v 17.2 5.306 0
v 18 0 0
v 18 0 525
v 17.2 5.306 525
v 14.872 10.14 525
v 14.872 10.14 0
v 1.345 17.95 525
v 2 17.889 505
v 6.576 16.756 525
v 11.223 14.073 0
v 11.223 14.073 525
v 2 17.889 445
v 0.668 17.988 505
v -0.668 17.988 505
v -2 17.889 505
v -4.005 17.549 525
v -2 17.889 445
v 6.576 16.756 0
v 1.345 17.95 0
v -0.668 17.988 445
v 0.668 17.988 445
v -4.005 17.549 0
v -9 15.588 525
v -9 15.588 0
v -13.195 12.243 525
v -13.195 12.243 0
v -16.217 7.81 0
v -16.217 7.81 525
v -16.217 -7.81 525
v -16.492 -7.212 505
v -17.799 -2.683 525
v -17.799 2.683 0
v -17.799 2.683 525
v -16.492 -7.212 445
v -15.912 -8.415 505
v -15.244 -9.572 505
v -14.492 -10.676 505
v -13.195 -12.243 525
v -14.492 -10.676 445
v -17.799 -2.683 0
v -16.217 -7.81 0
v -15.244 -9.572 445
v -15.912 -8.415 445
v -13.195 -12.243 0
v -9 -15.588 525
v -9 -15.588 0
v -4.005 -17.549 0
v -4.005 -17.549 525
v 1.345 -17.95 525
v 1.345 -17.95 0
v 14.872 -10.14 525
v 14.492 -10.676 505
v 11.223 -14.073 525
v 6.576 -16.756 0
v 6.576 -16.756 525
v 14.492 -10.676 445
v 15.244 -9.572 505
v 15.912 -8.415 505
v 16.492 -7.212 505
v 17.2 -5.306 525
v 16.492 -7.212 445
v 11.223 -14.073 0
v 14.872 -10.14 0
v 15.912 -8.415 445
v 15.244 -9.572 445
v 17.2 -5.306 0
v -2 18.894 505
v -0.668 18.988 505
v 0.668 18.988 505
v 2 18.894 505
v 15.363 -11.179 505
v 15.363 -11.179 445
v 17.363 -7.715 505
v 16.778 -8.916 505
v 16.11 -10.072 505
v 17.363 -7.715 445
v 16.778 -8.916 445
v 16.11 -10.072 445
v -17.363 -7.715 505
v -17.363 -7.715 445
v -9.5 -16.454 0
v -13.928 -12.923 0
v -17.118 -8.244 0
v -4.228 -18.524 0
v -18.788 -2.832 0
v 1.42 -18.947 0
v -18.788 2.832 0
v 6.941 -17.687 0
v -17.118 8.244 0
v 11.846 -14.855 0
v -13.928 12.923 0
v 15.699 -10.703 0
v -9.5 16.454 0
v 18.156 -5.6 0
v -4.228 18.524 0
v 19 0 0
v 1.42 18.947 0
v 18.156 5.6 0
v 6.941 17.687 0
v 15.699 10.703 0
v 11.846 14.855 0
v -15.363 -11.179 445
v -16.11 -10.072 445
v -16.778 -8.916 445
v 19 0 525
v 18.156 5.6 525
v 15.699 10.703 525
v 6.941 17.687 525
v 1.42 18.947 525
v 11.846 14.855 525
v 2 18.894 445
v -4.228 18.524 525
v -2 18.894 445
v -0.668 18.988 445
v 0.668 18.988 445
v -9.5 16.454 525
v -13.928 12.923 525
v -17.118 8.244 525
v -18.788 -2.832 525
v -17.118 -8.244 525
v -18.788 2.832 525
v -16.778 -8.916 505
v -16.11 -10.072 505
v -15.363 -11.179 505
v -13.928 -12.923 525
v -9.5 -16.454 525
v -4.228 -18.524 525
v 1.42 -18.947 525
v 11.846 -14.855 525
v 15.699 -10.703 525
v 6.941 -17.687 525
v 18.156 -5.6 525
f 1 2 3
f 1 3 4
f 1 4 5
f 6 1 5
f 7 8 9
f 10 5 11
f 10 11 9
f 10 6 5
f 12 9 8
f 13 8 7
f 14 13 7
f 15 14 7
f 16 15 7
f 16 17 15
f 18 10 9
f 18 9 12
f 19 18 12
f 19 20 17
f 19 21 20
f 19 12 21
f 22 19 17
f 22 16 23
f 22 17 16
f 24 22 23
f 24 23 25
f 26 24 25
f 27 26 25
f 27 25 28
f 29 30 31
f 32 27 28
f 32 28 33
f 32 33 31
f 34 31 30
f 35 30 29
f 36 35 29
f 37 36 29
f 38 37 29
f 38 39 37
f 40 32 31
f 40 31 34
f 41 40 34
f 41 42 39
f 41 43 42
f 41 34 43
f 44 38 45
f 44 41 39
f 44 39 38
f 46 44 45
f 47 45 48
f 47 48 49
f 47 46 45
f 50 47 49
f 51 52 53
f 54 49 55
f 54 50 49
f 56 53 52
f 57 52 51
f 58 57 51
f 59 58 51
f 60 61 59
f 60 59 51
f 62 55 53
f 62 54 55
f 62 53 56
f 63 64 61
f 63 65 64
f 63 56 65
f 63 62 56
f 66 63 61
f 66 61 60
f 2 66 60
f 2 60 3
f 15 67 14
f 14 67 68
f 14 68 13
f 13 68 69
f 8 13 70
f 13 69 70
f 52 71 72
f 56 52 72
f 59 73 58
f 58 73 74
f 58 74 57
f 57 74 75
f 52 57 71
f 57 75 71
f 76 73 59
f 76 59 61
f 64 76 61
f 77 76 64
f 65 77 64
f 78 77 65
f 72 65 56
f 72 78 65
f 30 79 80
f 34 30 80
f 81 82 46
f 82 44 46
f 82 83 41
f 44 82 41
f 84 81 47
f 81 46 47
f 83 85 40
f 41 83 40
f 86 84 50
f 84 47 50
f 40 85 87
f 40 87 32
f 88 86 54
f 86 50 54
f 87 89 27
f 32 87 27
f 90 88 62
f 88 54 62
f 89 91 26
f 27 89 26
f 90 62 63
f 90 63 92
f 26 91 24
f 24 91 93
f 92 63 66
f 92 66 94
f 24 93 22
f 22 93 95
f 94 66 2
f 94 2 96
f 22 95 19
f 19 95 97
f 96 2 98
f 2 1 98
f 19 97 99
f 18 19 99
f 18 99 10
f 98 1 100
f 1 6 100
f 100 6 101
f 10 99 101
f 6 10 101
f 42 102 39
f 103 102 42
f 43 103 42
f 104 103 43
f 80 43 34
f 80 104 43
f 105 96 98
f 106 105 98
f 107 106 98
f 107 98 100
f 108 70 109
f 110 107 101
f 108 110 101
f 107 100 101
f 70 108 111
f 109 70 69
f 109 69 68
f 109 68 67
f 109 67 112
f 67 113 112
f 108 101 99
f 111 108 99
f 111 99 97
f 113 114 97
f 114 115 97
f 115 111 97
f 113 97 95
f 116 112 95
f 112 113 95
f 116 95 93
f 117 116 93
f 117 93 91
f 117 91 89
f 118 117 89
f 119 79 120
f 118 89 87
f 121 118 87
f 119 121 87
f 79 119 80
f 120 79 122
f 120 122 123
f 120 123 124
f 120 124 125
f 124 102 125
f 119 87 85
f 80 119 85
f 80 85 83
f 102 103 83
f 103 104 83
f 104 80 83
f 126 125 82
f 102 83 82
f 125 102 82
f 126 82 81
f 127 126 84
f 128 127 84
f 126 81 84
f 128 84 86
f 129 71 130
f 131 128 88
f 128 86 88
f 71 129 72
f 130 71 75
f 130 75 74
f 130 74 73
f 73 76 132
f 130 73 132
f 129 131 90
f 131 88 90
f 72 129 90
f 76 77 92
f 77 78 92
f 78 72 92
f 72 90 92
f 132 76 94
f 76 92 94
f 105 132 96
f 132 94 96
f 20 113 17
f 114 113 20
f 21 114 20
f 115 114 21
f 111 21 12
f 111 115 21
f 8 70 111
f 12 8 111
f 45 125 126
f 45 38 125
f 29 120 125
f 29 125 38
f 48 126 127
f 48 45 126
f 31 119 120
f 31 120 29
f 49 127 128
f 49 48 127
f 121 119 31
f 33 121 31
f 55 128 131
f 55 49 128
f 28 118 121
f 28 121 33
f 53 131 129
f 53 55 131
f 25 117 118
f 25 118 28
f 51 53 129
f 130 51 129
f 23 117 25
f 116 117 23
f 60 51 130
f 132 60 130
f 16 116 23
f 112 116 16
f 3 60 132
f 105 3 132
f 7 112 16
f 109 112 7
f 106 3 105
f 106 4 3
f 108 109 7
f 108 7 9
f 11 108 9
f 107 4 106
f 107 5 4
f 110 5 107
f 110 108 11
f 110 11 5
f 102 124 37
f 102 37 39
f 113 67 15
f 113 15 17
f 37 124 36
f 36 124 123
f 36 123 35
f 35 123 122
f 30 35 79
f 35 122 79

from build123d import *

# Parameters (mm, degrees)
SKETCH1_R               = 19
SKETCH1_R_2             = 18
BOSS_EXTRUDE1_DEPTH     = 525
CUT_EXTRUDE1_REACH      = 528.716
CUT_EXTRUDE1_END_RADIUS = 18
SKETCH2_W               = 4
SKETCH2_H               = 60
CIRPATTERN1_COUNT       = 3


with BuildPart() as part:
    # Sketch1 → Boss-Extrude1 (new body)
    with BuildSketch(Plane.XY):
        Circle(SKETCH1_R)
        Circle(SKETCH1_R_2, mode=Mode.SUBTRACT)
    extrude(amount=BOSS_EXTRUDE1_DEPTH)

    # Cut-Extrude1: up to this cylinder (the profile starts outside it)
    cut_extrude1_end = Plane(origin=(0, 0, 475), z_dir=(0, 0, -1)) * Cylinder(CUT_EXTRUDE1_END_RADIUS, 1094.432, mode=Mode.PRIVATE)
    # Sketch2 → Cut-Extrude1 (cut, up to the surface)
    with BuildSketch(Plane(origin=(0, 19, 0), x_dir=(1, 0, 0), z_dir=(0, 1, 0)), mode=Mode.PRIVATE) as cut_extrude1_sk1:
        with Locations((0, -475)):
            Rectangle(SKETCH2_W, SKETCH2_H)
    cut_extrude1_tool1 = extrude(cut_extrude1_sk1.sketch, amount=-CUT_EXTRUDE1_REACH, mode=Mode.PRIVATE) - cut_extrude1_end
    cut_extrude1 = cut_extrude1_tool1.solids().sort_by_distance((0, 19, 475))[0]
    add(cut_extrude1, mode=Mode.SUBTRACT)

    # CirPattern1: Cut-Extrude1 ×3 about axis
    cirpattern1_axis = Axis((0, 0, 0), (0, 0, 1))
    for i in range(1, CIRPATTERN1_COUNT):
        add(cut_extrude1.rotate(cirpattern1_axis, i * 360 / CIRPATTERN1_COUNT), mode=Mode.SUBTRACT)


solid = part.part
